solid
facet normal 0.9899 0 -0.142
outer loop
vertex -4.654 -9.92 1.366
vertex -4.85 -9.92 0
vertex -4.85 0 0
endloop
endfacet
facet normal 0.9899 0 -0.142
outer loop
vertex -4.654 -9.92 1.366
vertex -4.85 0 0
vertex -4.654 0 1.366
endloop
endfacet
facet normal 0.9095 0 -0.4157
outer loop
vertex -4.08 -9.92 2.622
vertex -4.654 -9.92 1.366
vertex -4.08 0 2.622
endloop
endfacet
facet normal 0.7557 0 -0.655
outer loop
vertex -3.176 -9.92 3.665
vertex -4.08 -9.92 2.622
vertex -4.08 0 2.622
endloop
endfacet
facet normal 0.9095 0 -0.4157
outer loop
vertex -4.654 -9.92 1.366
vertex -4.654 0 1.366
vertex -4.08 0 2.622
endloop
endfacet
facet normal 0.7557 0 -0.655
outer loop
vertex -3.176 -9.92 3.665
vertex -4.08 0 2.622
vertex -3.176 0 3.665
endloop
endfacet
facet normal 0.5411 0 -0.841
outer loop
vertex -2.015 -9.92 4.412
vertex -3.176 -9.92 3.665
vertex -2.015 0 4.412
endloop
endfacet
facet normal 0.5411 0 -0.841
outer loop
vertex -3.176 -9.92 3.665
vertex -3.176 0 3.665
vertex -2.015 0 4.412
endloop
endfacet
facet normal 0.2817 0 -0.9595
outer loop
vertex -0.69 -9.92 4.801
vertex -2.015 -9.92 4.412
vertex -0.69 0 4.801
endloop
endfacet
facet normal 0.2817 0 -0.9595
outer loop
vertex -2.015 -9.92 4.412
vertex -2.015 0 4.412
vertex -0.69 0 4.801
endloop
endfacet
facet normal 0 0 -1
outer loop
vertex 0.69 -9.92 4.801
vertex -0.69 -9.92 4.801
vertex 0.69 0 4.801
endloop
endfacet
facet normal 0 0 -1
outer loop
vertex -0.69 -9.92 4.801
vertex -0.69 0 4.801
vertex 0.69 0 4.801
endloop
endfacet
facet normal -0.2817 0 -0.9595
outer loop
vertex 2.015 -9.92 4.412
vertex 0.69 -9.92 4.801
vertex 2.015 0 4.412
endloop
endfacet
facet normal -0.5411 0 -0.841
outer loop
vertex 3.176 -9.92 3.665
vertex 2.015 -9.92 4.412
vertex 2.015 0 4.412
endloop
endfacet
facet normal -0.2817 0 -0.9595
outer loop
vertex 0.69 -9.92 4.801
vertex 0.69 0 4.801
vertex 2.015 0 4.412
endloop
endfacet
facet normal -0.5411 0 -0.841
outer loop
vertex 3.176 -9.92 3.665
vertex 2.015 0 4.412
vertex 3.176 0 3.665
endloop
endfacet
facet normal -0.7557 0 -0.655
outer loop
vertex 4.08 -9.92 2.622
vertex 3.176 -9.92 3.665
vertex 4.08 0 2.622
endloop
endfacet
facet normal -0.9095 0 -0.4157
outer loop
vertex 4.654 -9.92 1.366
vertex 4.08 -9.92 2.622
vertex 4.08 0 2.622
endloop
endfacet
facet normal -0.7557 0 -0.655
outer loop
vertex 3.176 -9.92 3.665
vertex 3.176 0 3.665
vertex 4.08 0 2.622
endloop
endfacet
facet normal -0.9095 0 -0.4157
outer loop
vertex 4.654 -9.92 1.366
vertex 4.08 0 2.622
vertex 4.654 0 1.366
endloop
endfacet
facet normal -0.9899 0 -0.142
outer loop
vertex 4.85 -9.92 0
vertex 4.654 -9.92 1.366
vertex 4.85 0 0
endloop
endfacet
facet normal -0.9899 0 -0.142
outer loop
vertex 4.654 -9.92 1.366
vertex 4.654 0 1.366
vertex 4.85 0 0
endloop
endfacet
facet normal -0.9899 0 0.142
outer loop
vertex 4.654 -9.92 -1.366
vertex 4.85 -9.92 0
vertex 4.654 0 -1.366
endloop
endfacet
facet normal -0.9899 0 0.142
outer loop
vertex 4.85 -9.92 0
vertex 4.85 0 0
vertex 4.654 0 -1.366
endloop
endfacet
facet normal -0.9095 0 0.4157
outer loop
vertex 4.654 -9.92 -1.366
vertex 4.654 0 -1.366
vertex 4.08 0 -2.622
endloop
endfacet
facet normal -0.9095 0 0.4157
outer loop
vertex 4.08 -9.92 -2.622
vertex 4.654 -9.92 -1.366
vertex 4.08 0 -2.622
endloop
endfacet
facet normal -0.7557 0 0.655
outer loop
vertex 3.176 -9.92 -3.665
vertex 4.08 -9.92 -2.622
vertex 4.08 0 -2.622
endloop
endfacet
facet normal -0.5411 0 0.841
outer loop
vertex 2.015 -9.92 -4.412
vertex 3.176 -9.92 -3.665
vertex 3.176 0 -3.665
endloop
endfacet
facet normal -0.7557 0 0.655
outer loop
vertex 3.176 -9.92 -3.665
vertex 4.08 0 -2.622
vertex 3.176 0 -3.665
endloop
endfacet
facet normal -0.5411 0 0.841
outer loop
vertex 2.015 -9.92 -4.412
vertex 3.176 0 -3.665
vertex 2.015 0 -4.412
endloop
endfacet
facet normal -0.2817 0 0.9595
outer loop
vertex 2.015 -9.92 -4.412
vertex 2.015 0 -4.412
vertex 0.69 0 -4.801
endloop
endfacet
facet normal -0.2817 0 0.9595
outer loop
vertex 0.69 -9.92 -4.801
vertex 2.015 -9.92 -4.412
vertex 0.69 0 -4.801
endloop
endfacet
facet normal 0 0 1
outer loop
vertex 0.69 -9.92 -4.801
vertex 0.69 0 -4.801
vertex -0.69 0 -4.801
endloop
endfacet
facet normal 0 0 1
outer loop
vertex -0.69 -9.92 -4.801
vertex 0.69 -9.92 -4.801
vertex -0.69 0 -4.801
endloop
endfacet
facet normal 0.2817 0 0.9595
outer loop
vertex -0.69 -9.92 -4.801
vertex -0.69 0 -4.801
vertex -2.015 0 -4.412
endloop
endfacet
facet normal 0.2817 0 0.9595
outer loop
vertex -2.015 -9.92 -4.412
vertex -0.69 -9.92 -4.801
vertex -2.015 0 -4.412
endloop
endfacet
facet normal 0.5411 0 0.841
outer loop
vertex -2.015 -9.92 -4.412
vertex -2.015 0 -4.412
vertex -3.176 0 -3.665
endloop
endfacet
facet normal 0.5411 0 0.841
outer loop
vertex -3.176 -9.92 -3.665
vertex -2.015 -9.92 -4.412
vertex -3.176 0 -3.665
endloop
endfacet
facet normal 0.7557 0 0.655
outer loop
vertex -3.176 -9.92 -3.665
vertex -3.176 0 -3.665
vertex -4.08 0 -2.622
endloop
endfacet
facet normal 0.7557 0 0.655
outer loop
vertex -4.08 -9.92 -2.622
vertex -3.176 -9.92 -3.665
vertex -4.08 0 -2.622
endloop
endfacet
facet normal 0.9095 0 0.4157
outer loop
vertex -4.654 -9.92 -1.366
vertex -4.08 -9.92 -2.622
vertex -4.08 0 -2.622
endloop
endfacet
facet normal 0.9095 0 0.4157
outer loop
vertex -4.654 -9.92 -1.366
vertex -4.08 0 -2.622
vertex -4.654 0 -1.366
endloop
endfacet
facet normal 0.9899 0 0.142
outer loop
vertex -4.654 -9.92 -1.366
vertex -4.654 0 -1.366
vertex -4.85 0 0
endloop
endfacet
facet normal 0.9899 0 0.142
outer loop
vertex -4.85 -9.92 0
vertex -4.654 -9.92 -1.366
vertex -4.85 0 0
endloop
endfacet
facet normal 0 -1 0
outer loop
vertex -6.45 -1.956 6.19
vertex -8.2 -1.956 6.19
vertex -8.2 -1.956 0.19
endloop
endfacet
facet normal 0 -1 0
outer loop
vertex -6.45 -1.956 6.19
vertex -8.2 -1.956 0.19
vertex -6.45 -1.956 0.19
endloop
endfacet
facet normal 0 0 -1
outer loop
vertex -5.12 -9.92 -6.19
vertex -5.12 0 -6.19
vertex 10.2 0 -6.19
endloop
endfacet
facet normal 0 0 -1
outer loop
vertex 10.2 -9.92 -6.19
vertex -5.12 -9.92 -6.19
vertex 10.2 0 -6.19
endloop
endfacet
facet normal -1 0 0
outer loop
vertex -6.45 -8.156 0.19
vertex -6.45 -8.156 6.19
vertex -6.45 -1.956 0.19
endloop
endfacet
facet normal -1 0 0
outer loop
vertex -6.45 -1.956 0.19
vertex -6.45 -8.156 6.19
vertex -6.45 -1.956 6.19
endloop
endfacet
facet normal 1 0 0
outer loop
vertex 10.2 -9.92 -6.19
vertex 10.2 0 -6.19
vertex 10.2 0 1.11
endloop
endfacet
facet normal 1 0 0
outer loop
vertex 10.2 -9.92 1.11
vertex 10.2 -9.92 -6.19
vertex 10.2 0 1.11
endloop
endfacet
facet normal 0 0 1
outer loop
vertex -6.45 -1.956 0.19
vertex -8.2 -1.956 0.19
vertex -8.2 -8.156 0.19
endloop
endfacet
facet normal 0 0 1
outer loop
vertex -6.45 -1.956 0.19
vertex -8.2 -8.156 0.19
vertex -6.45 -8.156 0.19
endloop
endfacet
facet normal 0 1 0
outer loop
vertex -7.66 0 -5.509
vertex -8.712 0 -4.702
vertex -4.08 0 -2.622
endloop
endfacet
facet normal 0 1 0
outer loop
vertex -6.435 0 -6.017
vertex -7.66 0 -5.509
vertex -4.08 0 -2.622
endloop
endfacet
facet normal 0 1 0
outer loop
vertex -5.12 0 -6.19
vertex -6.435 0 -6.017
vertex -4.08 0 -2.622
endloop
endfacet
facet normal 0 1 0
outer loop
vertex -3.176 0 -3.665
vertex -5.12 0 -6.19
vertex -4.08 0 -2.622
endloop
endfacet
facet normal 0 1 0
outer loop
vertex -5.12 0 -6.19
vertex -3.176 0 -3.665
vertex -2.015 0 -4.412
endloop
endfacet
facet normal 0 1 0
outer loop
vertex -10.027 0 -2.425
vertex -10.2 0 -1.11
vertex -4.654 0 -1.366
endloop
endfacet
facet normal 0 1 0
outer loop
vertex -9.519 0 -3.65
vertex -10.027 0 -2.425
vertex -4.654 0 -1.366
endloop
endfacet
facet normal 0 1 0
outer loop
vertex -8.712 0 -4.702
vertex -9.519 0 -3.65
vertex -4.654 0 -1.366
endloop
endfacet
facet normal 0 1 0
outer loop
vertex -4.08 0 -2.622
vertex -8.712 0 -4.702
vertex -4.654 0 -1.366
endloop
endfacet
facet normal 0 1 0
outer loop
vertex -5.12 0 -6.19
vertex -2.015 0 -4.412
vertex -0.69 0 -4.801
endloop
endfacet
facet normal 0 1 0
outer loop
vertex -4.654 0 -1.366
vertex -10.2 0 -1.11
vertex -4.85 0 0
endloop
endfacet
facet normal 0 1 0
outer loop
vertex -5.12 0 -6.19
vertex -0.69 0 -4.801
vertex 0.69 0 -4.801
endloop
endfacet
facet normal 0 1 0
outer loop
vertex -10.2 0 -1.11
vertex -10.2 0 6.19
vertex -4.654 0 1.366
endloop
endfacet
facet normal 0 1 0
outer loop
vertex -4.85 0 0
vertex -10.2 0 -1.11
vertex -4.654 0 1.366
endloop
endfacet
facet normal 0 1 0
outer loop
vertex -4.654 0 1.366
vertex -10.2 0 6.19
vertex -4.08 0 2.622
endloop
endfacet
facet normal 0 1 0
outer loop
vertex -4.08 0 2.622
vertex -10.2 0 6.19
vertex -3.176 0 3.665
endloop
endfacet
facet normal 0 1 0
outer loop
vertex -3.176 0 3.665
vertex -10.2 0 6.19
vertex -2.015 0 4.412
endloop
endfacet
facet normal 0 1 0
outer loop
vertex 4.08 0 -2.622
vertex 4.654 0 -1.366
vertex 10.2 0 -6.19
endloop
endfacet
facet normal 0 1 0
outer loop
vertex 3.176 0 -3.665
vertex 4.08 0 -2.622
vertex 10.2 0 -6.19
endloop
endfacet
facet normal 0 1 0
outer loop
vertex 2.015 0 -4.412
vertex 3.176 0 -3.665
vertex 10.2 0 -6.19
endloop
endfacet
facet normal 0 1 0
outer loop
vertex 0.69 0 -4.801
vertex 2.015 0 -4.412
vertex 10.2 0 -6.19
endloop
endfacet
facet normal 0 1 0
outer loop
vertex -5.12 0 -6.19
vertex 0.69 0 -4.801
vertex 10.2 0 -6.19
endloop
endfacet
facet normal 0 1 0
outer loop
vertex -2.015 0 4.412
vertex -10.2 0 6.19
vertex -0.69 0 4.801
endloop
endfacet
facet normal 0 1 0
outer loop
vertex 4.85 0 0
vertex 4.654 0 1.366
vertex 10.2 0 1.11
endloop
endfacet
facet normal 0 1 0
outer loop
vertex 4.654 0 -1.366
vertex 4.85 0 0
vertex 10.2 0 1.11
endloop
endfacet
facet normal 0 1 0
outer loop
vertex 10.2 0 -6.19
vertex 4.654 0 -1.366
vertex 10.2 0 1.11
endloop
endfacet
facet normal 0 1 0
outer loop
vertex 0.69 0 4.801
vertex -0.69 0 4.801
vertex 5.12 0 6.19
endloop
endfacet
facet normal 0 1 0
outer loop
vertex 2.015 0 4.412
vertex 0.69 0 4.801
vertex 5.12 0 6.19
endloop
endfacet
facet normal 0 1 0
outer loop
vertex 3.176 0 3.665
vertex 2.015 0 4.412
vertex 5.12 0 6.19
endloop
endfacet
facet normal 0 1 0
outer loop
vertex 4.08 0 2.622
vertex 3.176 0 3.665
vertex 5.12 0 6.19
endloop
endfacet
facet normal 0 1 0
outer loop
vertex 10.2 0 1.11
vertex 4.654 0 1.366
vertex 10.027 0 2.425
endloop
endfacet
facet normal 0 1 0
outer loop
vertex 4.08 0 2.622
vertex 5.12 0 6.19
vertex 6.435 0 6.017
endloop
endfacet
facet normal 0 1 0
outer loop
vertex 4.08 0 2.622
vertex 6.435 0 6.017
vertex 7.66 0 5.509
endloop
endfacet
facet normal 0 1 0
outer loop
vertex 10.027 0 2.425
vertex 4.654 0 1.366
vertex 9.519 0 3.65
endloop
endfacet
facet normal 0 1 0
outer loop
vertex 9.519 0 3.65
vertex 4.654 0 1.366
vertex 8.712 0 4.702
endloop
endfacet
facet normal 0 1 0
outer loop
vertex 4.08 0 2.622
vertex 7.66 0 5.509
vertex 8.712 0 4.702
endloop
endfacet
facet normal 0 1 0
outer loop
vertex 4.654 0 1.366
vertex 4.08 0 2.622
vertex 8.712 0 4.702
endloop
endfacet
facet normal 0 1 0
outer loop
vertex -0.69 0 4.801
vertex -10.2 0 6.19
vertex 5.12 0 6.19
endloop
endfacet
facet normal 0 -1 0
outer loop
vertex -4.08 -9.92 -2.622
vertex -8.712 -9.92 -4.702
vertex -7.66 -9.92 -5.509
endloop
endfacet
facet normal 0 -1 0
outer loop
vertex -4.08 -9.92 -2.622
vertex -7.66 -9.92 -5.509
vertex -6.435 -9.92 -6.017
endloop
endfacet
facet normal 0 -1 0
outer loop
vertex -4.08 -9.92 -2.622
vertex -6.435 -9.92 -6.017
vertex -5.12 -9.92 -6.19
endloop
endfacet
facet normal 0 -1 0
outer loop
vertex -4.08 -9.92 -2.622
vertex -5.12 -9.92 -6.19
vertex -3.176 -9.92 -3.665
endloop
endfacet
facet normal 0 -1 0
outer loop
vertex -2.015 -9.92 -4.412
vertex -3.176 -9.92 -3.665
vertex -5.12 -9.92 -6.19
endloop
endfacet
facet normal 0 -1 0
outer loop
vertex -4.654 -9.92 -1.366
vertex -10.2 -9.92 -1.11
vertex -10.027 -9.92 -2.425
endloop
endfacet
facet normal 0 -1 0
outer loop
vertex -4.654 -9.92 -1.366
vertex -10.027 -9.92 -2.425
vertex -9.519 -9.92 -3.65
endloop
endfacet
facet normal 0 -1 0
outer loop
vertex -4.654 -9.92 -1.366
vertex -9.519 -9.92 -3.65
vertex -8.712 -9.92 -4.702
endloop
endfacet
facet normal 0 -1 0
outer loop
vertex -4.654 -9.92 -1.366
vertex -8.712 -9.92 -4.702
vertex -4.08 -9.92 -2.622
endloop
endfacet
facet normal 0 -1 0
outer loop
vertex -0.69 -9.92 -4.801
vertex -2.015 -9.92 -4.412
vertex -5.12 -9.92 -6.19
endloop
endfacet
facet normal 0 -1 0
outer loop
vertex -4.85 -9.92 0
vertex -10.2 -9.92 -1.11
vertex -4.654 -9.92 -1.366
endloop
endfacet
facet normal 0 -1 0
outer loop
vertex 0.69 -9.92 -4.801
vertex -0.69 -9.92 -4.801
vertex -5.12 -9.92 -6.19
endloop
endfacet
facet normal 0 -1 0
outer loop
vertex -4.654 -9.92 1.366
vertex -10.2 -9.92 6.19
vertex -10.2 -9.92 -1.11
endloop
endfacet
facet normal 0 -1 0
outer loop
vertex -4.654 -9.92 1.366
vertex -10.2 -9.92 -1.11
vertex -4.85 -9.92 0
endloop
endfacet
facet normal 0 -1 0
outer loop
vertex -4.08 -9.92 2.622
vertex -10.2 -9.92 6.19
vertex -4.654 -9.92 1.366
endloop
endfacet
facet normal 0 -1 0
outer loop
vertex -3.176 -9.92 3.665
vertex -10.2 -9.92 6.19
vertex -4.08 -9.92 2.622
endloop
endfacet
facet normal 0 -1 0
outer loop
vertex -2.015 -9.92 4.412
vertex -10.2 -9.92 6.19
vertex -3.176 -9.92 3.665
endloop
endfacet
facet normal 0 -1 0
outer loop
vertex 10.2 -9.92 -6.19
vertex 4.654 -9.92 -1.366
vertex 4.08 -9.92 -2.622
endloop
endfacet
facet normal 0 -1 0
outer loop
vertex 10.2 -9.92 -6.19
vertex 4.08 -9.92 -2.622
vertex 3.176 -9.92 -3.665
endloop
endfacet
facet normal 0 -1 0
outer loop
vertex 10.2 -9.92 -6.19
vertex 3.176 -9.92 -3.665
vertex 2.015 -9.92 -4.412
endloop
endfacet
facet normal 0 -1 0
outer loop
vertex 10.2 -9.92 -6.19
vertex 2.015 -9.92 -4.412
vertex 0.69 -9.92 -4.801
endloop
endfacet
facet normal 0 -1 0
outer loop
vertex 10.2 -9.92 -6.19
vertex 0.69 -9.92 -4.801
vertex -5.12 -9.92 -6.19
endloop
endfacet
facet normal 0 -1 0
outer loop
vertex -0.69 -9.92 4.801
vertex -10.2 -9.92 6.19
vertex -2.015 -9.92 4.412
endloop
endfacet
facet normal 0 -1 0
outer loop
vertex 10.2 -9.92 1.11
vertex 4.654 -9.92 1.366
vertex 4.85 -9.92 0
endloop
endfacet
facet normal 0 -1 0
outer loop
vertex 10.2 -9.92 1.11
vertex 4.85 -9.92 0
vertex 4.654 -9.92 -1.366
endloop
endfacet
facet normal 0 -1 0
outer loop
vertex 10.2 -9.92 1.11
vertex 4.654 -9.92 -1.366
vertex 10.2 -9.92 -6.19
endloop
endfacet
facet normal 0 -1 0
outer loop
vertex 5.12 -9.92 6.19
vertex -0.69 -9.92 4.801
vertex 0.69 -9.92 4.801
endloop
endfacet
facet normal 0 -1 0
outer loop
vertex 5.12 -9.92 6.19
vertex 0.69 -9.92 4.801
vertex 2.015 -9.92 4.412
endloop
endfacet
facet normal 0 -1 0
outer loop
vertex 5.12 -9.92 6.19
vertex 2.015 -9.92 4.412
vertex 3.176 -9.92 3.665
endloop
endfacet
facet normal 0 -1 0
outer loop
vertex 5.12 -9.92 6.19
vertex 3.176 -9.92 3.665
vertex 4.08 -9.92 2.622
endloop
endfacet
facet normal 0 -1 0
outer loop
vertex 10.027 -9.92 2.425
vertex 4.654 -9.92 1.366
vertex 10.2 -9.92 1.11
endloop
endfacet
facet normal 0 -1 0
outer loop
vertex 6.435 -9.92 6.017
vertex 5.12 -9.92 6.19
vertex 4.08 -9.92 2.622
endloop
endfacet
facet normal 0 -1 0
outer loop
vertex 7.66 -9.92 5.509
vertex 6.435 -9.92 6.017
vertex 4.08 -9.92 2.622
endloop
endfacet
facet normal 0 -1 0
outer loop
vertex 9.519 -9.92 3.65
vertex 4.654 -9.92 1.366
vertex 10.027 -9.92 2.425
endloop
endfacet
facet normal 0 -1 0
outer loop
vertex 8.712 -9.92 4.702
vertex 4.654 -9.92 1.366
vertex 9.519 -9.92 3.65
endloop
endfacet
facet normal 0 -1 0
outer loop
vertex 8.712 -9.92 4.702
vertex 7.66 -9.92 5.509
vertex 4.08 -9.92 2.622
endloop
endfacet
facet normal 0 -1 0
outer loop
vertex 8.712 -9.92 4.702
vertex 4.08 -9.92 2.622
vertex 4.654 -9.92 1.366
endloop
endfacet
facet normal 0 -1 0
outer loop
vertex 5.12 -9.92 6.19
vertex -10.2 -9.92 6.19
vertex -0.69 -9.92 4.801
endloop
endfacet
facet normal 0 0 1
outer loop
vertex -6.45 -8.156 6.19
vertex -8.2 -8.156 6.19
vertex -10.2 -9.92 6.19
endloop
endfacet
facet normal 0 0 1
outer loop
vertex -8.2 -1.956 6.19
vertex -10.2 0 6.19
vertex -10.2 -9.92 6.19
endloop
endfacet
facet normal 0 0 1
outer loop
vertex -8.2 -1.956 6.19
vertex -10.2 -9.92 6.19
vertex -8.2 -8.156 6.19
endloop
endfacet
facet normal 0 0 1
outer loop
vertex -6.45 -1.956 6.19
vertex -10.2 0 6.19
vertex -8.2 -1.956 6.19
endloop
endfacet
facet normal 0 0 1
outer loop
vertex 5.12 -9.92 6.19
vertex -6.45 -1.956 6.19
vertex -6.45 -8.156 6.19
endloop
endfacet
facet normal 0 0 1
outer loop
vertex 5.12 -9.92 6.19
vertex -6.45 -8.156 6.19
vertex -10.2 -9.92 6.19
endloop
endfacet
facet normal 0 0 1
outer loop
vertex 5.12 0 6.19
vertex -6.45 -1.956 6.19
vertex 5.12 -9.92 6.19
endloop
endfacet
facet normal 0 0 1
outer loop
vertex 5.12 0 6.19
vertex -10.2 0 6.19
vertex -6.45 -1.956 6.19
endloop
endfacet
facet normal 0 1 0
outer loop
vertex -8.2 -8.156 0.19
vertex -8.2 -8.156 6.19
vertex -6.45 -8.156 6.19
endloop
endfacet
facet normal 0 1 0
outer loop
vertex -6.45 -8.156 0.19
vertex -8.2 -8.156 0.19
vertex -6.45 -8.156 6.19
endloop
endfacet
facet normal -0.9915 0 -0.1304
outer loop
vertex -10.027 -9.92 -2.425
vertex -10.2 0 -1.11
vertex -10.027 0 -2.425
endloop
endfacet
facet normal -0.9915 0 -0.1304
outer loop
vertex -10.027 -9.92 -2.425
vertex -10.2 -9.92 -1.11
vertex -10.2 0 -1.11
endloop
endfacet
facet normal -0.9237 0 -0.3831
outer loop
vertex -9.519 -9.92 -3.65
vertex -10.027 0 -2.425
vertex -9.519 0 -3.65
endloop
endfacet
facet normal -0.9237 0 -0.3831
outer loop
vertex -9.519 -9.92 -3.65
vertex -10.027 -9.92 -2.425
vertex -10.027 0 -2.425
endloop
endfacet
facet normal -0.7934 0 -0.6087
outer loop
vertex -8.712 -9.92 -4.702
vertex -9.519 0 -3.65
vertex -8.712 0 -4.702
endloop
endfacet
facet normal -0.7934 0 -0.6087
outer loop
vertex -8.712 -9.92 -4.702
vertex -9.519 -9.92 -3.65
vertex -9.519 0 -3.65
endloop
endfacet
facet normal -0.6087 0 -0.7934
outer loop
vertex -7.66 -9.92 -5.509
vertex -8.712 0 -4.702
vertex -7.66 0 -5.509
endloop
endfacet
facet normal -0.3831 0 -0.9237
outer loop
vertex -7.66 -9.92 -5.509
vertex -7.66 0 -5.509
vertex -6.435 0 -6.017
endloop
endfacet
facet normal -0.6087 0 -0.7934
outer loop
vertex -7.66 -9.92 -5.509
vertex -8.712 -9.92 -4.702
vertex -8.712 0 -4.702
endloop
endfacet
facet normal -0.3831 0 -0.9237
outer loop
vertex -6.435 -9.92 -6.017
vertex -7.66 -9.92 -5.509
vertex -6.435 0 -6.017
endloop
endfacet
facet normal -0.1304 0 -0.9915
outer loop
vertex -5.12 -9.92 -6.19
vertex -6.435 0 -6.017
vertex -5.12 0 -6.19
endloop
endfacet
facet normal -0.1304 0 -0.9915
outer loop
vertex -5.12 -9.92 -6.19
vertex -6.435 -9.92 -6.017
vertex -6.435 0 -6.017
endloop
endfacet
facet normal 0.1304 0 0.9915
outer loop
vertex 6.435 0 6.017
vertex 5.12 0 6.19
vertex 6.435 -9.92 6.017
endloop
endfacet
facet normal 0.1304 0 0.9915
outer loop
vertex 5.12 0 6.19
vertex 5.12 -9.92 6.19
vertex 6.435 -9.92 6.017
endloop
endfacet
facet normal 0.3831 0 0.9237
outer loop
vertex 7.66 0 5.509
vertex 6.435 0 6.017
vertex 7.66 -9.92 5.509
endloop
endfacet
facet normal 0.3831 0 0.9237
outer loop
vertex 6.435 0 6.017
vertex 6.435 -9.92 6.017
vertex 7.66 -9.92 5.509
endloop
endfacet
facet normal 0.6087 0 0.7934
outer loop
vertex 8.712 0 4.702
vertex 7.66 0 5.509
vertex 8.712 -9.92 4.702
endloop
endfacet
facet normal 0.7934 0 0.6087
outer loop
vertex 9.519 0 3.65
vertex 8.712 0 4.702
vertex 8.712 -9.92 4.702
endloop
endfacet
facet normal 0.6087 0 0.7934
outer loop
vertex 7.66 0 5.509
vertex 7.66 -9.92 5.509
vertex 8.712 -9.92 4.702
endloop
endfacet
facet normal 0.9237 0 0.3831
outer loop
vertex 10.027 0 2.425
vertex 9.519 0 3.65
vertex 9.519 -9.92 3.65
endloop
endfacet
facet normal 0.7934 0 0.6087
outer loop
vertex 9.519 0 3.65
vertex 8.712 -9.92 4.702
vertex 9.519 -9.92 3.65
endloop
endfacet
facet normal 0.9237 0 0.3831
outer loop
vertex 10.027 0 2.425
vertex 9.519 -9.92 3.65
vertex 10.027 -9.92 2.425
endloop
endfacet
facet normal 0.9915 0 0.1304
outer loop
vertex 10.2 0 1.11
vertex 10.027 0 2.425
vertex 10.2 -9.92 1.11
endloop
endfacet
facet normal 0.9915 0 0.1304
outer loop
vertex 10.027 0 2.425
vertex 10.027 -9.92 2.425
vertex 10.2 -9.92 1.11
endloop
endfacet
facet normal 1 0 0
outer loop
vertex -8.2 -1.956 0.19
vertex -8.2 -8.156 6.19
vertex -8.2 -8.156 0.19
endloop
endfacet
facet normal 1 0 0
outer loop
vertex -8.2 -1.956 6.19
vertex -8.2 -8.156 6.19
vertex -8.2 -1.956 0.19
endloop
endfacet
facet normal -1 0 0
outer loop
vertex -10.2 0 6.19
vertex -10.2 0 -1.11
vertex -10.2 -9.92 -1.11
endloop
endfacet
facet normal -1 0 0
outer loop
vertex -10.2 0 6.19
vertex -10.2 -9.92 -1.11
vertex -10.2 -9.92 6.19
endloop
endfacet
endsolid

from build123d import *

# Parameters (mm, degrees)
F0_W     = 20.4
F0_H     = 12.38
F1_DEPTH = 9.92
F3_D     = 9.7
F4_R     = 5.08
F5_W     = 1.75
F5_H     = 6.2
F6_DEPTH = 6
F7_R     = 5.08


with BuildPart() as f1:
    # F0 (on Front) → F1 (new body)
    with BuildSketch(Plane.XZ):
        Rectangle(F0_W, F0_H)
    extrude(amount=F1_DEPTH)

    # F3 (through all)
    with Locations(Plane.XZ.offset(9.92)):
        with Locations((0, 0)):
            Hole(F3_D / 2)

    # F4
    f4_edges = [f1.edges().sort_by_distance(p)[0] for p in [
        (10.2, -4.96, 6.19),
    ]]
    fillet(f4_edges, radius=F4_R)

    # F5 (on face) → F6 (cut)
    with BuildSketch(Plane.XY.offset(6.19)):
        with Locations((-7.325, -5.0558)):
            Rectangle(F5_W, F5_H)
    extrude(amount=-F6_DEPTH, mode=Mode.SUBTRACT)

    # F7
    f7_edges = [f1.edges().sort_by_distance(p)[0] for p in [
        (-10.2, -4.96, -6.19),
    ]]
    fillet(f7_edges, radius=F7_R)


solid = f1.part
